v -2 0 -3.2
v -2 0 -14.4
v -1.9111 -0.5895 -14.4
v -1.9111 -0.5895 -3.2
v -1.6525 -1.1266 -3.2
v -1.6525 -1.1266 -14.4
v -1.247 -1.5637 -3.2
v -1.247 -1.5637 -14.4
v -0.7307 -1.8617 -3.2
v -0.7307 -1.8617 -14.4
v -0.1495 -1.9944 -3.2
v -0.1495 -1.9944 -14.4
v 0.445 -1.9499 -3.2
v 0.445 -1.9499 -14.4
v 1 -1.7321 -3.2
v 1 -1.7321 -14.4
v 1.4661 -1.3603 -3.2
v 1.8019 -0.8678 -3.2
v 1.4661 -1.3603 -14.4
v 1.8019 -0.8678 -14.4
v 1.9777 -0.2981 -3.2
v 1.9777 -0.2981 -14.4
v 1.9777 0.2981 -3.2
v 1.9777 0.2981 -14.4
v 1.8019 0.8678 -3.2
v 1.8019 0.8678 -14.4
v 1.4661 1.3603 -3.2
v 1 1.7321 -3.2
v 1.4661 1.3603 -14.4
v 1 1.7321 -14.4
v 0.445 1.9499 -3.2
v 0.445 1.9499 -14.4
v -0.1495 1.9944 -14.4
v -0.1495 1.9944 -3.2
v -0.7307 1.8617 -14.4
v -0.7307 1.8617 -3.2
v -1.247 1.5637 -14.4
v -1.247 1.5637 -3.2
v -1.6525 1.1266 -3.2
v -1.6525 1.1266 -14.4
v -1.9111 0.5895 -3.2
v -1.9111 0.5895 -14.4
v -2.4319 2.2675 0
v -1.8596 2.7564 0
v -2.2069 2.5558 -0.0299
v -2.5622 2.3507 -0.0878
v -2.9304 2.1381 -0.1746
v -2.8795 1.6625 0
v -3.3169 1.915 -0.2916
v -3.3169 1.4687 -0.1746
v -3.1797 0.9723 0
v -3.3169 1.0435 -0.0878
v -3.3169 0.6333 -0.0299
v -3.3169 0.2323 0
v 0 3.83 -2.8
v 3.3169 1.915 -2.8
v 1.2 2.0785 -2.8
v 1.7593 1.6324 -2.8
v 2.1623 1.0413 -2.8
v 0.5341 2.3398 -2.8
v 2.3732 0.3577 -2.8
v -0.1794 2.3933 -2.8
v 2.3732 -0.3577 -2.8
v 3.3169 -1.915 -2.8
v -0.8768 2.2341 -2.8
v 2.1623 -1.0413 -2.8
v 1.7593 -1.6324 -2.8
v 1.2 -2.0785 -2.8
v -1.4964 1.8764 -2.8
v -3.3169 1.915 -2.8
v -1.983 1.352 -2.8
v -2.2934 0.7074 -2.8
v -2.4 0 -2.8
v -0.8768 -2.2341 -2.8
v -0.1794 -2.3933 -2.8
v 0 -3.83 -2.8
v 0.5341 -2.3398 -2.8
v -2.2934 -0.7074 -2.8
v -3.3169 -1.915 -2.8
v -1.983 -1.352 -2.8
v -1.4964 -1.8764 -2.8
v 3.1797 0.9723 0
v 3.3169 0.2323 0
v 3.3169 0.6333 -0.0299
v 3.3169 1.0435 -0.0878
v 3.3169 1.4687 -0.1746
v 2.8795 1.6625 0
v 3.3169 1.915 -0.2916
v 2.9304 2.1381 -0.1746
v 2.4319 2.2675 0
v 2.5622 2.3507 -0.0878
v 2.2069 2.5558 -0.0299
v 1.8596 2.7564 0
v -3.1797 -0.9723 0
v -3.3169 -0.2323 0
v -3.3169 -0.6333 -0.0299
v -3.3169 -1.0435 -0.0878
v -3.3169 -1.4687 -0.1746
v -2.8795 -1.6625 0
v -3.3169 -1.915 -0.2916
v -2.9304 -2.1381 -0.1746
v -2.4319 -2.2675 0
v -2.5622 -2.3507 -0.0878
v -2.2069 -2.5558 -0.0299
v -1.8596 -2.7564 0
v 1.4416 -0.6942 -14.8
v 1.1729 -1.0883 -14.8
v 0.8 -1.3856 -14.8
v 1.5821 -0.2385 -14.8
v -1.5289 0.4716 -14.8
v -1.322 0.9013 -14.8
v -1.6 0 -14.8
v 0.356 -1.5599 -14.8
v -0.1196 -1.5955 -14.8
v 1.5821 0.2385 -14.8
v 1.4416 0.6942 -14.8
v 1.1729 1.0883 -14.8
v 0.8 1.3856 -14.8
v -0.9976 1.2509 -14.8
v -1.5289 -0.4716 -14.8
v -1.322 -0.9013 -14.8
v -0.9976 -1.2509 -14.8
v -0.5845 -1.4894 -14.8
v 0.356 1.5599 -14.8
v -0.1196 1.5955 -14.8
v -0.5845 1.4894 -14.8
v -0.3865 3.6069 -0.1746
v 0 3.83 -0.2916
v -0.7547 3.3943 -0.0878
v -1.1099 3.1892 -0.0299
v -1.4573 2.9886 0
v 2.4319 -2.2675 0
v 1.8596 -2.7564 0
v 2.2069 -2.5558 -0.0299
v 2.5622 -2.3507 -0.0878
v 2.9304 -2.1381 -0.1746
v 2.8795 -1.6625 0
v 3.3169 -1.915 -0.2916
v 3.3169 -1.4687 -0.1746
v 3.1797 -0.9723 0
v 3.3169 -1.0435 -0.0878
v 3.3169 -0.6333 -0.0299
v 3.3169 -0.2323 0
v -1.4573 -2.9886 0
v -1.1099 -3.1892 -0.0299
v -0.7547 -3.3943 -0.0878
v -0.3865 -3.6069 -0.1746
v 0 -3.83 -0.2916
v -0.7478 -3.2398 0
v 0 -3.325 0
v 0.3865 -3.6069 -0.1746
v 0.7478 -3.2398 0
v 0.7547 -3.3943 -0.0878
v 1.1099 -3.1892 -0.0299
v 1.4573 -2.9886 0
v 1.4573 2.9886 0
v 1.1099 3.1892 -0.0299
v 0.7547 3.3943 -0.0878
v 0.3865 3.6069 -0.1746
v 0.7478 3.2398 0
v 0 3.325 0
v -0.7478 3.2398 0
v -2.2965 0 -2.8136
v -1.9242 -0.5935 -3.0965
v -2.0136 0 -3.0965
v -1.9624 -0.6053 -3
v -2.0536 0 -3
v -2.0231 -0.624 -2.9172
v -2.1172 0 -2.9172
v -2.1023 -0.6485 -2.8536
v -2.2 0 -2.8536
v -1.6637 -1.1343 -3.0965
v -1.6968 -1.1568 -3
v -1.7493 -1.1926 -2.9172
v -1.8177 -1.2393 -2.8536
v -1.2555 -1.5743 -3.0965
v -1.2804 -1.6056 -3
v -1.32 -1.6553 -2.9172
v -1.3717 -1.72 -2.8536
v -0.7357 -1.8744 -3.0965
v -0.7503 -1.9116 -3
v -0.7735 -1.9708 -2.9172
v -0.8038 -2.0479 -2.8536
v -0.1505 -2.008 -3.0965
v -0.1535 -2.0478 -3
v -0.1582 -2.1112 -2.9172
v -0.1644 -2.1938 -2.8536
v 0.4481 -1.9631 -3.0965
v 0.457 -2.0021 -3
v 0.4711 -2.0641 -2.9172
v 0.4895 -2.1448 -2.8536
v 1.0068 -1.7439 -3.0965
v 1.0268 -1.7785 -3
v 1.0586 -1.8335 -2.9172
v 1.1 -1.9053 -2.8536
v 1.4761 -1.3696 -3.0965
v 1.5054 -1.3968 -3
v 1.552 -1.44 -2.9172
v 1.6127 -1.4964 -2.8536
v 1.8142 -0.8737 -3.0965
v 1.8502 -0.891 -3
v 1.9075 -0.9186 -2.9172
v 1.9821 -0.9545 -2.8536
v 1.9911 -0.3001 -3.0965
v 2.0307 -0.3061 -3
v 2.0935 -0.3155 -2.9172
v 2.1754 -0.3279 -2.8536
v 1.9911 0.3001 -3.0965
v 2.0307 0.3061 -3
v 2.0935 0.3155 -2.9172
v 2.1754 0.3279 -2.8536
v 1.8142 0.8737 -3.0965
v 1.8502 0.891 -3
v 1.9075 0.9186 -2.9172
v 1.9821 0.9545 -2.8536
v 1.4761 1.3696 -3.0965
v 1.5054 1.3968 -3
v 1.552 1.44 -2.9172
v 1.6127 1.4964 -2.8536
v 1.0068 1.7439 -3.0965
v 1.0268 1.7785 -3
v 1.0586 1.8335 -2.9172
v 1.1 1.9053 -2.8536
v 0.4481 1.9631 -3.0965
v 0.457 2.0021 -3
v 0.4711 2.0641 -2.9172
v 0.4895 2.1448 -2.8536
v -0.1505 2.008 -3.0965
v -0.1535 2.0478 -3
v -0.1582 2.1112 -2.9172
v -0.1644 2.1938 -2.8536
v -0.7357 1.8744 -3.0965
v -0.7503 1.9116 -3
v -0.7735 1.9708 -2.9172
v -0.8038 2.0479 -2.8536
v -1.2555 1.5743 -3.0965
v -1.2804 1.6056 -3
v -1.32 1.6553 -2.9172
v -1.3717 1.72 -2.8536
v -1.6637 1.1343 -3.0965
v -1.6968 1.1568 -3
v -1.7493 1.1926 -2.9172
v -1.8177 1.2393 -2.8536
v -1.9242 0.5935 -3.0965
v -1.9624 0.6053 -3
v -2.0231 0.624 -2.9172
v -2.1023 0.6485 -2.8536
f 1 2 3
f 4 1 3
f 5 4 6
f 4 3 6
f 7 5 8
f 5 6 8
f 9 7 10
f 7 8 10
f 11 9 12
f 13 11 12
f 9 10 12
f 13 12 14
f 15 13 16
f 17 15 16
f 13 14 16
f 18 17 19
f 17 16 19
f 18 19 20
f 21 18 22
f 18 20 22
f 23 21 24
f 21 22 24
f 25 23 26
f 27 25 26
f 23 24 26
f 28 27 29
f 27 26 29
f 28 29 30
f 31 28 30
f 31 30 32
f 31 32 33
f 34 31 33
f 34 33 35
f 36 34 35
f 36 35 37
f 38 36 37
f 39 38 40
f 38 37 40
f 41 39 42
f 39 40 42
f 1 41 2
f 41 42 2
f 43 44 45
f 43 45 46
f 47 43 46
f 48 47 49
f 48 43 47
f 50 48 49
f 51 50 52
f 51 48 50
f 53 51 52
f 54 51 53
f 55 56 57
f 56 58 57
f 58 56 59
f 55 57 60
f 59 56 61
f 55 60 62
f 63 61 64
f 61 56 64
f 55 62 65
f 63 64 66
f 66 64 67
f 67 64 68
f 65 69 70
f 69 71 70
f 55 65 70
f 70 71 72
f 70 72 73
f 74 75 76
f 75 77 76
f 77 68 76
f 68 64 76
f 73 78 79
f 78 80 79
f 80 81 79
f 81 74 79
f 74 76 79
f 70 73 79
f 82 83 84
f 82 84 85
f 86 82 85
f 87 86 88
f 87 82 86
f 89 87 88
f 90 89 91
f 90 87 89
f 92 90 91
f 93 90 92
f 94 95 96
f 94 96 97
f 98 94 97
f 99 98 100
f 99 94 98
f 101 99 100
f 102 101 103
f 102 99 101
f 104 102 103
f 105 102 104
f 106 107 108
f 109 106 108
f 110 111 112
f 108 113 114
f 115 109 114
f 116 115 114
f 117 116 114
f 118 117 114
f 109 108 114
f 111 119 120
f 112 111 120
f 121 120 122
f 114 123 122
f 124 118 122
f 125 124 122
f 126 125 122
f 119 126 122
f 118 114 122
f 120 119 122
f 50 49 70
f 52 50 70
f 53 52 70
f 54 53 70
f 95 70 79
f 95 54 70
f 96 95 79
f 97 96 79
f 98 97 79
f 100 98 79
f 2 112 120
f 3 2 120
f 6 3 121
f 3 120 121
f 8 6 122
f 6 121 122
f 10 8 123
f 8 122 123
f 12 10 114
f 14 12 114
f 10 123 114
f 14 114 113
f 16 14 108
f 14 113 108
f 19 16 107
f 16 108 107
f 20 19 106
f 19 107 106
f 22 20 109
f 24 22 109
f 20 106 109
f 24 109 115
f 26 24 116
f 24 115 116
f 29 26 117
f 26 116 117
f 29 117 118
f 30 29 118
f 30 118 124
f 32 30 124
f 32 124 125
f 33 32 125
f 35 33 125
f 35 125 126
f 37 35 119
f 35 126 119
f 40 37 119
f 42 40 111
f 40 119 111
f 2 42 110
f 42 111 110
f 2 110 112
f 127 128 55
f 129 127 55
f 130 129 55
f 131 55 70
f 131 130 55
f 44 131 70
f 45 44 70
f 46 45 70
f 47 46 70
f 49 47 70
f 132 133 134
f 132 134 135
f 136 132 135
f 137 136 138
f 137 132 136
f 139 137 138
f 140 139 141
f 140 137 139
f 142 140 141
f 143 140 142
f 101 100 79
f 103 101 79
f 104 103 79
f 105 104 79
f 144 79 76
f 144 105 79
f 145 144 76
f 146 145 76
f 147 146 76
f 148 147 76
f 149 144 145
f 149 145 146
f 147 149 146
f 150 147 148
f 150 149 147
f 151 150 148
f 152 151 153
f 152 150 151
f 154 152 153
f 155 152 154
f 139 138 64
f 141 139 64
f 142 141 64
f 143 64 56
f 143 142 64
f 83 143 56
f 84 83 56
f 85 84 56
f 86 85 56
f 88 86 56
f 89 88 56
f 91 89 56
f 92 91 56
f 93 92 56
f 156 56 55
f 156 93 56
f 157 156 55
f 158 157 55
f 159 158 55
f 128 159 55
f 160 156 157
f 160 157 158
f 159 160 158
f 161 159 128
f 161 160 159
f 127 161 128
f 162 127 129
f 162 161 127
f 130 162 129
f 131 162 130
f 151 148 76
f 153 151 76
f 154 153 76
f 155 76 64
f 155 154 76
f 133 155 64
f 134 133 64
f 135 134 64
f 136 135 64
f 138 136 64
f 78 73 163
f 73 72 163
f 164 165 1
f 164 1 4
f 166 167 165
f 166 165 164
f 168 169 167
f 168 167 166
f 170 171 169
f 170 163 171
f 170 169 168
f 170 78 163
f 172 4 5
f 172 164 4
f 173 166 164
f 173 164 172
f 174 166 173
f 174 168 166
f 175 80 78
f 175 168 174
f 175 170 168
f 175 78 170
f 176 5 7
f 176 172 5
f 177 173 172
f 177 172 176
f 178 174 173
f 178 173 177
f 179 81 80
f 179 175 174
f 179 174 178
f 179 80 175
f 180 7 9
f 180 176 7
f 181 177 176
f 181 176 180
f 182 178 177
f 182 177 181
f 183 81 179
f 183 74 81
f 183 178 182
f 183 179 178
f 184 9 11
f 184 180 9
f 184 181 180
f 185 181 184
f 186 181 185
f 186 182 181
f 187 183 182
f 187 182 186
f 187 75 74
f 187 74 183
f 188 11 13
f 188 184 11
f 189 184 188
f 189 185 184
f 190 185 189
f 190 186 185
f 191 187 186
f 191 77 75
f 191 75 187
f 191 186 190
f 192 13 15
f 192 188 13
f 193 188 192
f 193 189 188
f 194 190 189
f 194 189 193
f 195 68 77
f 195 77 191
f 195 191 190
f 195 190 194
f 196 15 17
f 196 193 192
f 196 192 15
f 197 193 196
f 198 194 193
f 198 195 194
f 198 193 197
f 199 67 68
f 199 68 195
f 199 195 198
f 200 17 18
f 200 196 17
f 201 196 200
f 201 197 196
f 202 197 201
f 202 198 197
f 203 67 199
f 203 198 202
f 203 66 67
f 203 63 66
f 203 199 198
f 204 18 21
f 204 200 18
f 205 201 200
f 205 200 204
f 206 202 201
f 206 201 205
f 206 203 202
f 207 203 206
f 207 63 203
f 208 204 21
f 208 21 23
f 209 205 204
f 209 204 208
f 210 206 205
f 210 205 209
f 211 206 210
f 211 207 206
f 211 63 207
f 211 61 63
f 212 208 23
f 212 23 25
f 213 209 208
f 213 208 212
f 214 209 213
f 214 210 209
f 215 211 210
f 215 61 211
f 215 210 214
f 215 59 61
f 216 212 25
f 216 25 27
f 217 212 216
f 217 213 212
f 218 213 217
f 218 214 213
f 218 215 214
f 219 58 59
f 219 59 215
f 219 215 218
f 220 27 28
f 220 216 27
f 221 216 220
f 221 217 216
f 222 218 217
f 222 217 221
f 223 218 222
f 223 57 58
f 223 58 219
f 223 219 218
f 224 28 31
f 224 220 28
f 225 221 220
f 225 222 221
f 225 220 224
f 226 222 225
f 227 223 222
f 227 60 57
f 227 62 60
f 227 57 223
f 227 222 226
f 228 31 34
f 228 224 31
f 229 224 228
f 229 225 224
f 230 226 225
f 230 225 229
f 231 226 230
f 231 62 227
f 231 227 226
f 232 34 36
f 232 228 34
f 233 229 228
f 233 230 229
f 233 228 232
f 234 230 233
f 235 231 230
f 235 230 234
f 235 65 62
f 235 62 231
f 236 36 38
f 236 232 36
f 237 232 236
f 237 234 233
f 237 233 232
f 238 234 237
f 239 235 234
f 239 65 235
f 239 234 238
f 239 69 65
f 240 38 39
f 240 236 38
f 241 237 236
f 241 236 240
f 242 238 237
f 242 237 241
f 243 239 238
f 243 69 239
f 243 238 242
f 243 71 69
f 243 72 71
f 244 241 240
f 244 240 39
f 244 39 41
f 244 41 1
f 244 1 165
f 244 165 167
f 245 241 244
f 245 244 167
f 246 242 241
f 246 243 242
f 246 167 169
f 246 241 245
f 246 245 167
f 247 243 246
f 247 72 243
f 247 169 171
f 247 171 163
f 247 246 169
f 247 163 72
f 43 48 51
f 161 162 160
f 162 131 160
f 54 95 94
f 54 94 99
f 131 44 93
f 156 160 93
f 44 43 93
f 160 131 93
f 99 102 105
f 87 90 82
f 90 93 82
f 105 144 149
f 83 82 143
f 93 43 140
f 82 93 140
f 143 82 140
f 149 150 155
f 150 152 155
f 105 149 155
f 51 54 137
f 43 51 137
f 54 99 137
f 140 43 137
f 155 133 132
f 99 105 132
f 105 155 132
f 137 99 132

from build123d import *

# Parameters (mm, degrees)
SKETCH_2_OUTSIDE_W  = 13.726
SKETCH_2_OUTSIDE_H  = 13.726
CUT_EXTRUDE_1_DEPTH = 2.8
CHAMFER_1_SIZE      = 0.4
FILLET_1_R          = 0.4


with BuildPart() as part:
    # Эскиз1 → Повернуть1 (revolve)
    with BuildSketch(Plane(origin=(0, 0, 0), x_dir=(1, 0, 0), z_dir=(0, 1, 0))):
        Polygon((0, 0), (-4, 0), (-4, 2.8), (-2, 2.8), (-2, 14.8), (0, 14.8), align=None)
    revolve(axis=Axis((0, 0, -14.8), (0, 0, 1)))

    # Эскиз2 outside → Вырез-Вытянуть1 (cut)
    with BuildSketch(Plane.XY):
        Rectangle(SKETCH_2_OUTSIDE_W, SKETCH_2_OUTSIDE_H)
        Polygon((0, 3.83), (-3.316877296, 1.915), (-3.316877296, -1.915), (0, -3.83), (3.316877296, -1.915), (3.316877296, 1.915), align=None, mode=Mode.SUBTRACT)
    extrude(amount=-CUT_EXTRUDE_1_DEPTH, mode=Mode.SUBTRACT)

    # Эскиз3 → Вырез-Повернуть1 (revolve, cut)
    with BuildSketch(Plane(origin=(0, 0, 0), x_dir=(0, 0, -1), z_dir=(1, 0, 0))):
        Polygon((0, 3.83), (0.291561886, 3.83), (0, 3.325), align=None)
    revolve(axis=Axis((0, 0, 0), (0, 0, 1)), mode=Mode.SUBTRACT)

    # Фаска1
    chamfer_1_edges = [part.edges().sort_by_distance(p)[0] for p in [
        (2, 0, -14.8),
    ]]
    chamfer(chamfer_1_edges, length=CHAMFER_1_SIZE)

    # Скругление1
    fillet_1_edges = [part.edges().sort_by_distance(p)[0] for p in [
        (2, 0, -2.8),
    ]]
    fillet(fillet_1_edges, radius=FILLET_1_R)


solid = part.part
